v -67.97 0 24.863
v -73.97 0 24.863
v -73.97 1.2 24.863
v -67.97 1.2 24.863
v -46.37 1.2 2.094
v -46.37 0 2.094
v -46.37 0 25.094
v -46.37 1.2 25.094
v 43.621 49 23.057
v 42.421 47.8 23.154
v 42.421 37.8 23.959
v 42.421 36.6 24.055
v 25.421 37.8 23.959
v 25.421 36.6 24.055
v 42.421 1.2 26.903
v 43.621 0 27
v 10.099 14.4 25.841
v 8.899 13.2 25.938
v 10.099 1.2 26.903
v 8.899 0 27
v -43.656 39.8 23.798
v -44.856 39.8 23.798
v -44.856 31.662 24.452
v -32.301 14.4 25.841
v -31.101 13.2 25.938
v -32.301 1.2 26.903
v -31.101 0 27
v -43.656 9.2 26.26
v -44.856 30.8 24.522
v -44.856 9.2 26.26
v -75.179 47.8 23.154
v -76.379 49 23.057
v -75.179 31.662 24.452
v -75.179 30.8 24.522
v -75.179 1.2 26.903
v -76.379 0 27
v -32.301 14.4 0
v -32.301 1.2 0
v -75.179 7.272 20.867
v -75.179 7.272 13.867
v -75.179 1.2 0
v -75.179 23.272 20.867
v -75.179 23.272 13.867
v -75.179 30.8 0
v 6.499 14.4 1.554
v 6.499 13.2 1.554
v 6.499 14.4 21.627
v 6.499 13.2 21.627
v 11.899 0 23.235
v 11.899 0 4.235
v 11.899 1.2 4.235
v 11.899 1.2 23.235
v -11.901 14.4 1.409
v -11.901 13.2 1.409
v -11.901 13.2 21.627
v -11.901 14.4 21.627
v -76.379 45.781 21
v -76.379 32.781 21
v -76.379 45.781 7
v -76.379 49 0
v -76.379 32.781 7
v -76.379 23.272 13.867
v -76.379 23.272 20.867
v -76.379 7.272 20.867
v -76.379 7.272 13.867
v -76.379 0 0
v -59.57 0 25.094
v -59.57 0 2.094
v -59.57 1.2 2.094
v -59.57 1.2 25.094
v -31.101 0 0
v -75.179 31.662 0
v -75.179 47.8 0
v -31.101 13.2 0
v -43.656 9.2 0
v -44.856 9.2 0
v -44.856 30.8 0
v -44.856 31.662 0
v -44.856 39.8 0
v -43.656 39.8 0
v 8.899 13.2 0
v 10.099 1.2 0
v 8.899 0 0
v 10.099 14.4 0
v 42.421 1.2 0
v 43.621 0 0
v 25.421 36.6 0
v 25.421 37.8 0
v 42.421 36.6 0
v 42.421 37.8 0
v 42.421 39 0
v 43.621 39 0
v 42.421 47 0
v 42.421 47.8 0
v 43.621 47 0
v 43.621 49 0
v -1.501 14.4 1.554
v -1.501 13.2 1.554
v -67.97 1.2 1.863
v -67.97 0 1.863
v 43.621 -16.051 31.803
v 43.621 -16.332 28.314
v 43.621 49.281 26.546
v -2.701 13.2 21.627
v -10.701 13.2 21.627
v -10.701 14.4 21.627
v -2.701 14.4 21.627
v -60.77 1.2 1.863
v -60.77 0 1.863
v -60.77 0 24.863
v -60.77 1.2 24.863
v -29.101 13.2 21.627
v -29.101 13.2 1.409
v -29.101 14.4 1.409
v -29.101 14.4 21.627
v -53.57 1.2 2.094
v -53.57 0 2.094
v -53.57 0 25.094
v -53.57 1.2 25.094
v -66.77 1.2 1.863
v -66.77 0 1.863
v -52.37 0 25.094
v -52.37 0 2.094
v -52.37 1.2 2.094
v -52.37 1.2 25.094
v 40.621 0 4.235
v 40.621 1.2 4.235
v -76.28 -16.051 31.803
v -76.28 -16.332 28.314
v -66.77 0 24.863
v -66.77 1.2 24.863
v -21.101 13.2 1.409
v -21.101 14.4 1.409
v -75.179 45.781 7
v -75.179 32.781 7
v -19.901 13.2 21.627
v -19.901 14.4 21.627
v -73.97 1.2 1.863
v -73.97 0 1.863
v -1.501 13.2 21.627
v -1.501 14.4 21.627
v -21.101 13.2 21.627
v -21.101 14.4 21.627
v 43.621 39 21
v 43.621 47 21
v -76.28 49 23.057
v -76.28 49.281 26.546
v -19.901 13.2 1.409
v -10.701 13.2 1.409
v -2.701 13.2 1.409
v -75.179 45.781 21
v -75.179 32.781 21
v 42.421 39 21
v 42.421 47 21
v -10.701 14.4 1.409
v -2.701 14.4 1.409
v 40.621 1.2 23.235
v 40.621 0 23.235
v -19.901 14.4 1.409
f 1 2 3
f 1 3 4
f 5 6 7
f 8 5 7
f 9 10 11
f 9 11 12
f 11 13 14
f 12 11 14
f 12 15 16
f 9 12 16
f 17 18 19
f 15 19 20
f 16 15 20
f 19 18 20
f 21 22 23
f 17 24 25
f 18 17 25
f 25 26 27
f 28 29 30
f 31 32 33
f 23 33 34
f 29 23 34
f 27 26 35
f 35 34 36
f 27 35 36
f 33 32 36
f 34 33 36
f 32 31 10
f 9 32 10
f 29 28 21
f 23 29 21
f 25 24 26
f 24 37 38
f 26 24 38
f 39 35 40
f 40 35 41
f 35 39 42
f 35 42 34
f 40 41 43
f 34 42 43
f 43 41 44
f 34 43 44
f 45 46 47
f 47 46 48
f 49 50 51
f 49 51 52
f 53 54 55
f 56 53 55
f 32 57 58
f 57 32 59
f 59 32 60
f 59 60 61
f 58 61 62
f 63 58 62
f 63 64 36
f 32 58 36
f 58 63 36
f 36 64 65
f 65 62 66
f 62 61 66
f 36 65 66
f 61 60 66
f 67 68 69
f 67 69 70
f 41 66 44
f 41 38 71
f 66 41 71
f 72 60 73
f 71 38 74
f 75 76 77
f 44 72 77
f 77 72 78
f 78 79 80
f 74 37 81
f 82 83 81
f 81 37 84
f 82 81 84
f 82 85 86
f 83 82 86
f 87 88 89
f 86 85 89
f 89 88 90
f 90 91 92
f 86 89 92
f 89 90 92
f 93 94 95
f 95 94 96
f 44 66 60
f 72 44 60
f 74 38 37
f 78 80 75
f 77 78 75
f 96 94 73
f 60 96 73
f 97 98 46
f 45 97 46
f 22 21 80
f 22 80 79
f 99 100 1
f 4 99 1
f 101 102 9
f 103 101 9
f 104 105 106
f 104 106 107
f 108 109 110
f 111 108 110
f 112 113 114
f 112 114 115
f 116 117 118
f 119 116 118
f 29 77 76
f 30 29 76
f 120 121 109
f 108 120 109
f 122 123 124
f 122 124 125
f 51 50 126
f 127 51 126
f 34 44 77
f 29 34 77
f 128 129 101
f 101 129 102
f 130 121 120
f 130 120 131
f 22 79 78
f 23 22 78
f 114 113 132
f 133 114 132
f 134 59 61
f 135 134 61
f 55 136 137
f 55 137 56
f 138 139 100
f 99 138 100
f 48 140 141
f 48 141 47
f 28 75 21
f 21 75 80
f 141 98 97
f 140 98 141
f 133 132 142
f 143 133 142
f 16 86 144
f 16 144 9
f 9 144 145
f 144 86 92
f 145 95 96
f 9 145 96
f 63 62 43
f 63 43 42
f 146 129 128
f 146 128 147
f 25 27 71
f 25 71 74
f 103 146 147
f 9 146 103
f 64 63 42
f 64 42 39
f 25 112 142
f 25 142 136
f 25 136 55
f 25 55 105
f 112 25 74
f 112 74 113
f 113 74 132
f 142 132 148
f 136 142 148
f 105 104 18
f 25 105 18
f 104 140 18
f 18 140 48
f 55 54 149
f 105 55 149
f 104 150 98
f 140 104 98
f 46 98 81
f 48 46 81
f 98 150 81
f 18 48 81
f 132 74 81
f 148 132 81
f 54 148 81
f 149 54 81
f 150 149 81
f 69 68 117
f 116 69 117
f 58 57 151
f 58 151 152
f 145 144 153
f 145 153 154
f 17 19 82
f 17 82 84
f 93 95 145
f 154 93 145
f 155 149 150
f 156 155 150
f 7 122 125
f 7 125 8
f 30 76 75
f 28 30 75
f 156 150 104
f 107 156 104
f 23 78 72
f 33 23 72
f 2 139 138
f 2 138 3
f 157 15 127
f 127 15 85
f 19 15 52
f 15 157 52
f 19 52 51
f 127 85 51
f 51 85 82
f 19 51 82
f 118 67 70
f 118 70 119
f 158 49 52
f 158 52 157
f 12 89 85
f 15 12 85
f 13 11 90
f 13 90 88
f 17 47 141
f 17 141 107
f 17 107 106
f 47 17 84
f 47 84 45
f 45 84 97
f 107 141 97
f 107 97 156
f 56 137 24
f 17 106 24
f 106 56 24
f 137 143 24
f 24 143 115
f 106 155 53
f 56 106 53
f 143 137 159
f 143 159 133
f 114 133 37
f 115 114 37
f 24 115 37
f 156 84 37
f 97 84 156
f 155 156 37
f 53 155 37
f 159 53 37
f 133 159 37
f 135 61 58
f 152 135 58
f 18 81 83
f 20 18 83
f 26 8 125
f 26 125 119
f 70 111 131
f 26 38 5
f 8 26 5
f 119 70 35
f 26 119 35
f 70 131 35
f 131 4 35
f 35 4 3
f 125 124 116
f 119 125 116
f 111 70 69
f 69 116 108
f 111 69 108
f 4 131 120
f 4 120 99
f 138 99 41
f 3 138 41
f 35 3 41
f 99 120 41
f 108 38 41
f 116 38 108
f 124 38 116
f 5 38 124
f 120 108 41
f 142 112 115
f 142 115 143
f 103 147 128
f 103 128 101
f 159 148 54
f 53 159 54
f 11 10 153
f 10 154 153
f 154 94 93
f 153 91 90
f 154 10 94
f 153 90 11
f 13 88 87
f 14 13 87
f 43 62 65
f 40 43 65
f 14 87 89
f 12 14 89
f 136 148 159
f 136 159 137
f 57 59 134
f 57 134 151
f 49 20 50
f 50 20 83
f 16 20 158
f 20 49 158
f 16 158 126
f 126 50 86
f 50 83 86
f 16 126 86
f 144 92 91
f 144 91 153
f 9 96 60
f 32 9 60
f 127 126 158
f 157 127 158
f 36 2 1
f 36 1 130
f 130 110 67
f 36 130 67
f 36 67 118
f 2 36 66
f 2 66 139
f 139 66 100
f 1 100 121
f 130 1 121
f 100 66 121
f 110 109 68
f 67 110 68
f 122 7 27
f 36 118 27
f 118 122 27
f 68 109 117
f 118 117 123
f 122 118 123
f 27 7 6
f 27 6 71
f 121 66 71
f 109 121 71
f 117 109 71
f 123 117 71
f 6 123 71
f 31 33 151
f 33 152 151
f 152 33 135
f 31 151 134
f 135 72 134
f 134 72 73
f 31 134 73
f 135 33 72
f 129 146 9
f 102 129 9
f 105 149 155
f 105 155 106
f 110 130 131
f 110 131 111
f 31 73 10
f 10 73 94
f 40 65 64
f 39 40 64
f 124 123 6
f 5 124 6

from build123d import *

# Parameters (mm, degrees)
F1_DEPTH  = 27
F2_W      = 6
F2_H      = 23
F3_DEPTH  = 1.2
F4_W      = 13
F4_H      = 14
F4_W_2    = 16
F4_H_2    = 7
F5_DEPTH  = 1.2
F6_W      = 28.721702
F6_H      = 19
F7_DEPTH  = 1.2
F8_W      = 8
F8_H      = 20.218185
F8_H_2    = 20.07273
F9_DEPTH  = 1.2
F10_W     = 8
F10_H     = 21
F11_DEPTH = 1.2
F13_DEPTH = 120.001
F14_W     = 119.900497
F14_H     = 65.543256
F15_DEPTH = 3.5


with BuildPart() as f1:
    # F0 (on Top) → F1 (new body)
    with BuildSketch(Plane.XY):
        Polygon((43.620902, 49), (-76.379098, 49), (-76.379098, 0), (-31.1008, 0), (-31.1008, 1.2), (-31.1008, 13.2), (8.8992, 13.2), (8.8992, 1.2), (8.8992, 0), (43.620902, 0), align=None)
        Polygon((-75.179098, 31.661995), (-75.179098, 47.8), (42.420902, 47.8), (42.420902, 37.8), (25.420902, 37.8), (25.420902, 36.6), (42.420902, 36.6), (42.420902, 1.2), (10.0992, 1.2), (10.0992, 14.4), (-32.3008, 14.4), (-32.3008, 1.2), (-75.179098, 1.2), (-75.179098, 30.8), (-44.855535, 30.8), (-44.855535, 9.2), (-43.655535, 9.2), (-43.655535, 39.8), (-44.855535, 39.8), (-44.855535, 31.661995), align=None, mode=Mode.SUBTRACT)
    extrude(amount=F1_DEPTH)

    # F2 (on face) → F3 (cut)
    with BuildSketch(Plane.XZ):
        with Locations((-70.970154, 13.362575)):
            Rectangle(F2_W, F2_H)
        with Locations((-63.770154, 13.362575)):
            Rectangle(F2_W, F2_H)
        with Locations((-56.570154, 13.593571)):
            Rectangle(F2_W, F2_H)
        with Locations((-49.370154, 13.593571)):
            Rectangle(F2_W, F2_H)
    extrude(amount=-F3_DEPTH, mode=Mode.SUBTRACT)

    # F4 (on face) → F5 (cut)
    with BuildSketch(Plane(origin=(-76.379098, 0, 0), x_dir=(0, -1, 0), z_dir=(-1, 0, 0))):
        with Locations((-39.280942, 14)):
            Rectangle(F4_W, F4_H)
        with Locations((-15.271928, 17.366726)):
            Rectangle(F4_W_2, F4_H_2)
    extrude(amount=-F5_DEPTH, mode=Mode.SUBTRACT)

    # F6 (on face) → F7 (cut)
    with BuildSketch(Plane.XZ):
        with Locations((26.260051, 13.734649)):
            Rectangle(F6_W, F6_H)
    extrude(amount=-F7_DEPTH, mode=Mode.SUBTRACT)

    # F8 (on face) → F9 (cut)
    with BuildSketch(Plane.XZ.offset(-13.2)):
        with Locations((-25.1008, 11.517837)):
            Rectangle(F8_W, F8_H)
        with Locations((-15.9008, 11.517837)):
            Rectangle(F8_W, F8_H)
        with Locations((-6.7008, 11.517837)):
            Rectangle(F8_W, F8_H)
        with Locations((2.4992, 11.590565)):
            Rectangle(F8_W, F8_H_2)
    extrude(amount=-F9_DEPTH, mode=Mode.SUBTRACT)

    # F10 (on face) → F11 (cut)
    with BuildSketch(Plane.YZ.offset(43.620902)):
        with Locations((43, 10.5)):
            Rectangle(F10_W, F10_H)
    extrude(amount=-F11_DEPTH, mode=Mode.SUBTRACT)

    # F12 (on face) → F13 (cut, through all)
    with BuildSketch(Plane(origin=(-76.379098, 0, 0), x_dir=(0, -1, 0), z_dir=(-1, 0, 0))):
        Polygon((-49, 27), (-49, 23.057433), (0, 27), align=None)
    extrude(amount=-F13_DEPTH, mode=Mode.SUBTRACT)


with BuildPart() as f15:
    # F14 (on face) → F15 (new body)
    with BuildSketch(Plane(origin=(0, 2.158461, 26.826329), x_dir=(1, 0, 0), z_dir=(0, 0.080201, 0.996779))):
        with Locations((-16.329346, 14.22129)):
            Rectangle(F14_W, F14_H)
    extrude(amount=F15_DEPTH)


solid = Compound([f1.part, f15.part])
